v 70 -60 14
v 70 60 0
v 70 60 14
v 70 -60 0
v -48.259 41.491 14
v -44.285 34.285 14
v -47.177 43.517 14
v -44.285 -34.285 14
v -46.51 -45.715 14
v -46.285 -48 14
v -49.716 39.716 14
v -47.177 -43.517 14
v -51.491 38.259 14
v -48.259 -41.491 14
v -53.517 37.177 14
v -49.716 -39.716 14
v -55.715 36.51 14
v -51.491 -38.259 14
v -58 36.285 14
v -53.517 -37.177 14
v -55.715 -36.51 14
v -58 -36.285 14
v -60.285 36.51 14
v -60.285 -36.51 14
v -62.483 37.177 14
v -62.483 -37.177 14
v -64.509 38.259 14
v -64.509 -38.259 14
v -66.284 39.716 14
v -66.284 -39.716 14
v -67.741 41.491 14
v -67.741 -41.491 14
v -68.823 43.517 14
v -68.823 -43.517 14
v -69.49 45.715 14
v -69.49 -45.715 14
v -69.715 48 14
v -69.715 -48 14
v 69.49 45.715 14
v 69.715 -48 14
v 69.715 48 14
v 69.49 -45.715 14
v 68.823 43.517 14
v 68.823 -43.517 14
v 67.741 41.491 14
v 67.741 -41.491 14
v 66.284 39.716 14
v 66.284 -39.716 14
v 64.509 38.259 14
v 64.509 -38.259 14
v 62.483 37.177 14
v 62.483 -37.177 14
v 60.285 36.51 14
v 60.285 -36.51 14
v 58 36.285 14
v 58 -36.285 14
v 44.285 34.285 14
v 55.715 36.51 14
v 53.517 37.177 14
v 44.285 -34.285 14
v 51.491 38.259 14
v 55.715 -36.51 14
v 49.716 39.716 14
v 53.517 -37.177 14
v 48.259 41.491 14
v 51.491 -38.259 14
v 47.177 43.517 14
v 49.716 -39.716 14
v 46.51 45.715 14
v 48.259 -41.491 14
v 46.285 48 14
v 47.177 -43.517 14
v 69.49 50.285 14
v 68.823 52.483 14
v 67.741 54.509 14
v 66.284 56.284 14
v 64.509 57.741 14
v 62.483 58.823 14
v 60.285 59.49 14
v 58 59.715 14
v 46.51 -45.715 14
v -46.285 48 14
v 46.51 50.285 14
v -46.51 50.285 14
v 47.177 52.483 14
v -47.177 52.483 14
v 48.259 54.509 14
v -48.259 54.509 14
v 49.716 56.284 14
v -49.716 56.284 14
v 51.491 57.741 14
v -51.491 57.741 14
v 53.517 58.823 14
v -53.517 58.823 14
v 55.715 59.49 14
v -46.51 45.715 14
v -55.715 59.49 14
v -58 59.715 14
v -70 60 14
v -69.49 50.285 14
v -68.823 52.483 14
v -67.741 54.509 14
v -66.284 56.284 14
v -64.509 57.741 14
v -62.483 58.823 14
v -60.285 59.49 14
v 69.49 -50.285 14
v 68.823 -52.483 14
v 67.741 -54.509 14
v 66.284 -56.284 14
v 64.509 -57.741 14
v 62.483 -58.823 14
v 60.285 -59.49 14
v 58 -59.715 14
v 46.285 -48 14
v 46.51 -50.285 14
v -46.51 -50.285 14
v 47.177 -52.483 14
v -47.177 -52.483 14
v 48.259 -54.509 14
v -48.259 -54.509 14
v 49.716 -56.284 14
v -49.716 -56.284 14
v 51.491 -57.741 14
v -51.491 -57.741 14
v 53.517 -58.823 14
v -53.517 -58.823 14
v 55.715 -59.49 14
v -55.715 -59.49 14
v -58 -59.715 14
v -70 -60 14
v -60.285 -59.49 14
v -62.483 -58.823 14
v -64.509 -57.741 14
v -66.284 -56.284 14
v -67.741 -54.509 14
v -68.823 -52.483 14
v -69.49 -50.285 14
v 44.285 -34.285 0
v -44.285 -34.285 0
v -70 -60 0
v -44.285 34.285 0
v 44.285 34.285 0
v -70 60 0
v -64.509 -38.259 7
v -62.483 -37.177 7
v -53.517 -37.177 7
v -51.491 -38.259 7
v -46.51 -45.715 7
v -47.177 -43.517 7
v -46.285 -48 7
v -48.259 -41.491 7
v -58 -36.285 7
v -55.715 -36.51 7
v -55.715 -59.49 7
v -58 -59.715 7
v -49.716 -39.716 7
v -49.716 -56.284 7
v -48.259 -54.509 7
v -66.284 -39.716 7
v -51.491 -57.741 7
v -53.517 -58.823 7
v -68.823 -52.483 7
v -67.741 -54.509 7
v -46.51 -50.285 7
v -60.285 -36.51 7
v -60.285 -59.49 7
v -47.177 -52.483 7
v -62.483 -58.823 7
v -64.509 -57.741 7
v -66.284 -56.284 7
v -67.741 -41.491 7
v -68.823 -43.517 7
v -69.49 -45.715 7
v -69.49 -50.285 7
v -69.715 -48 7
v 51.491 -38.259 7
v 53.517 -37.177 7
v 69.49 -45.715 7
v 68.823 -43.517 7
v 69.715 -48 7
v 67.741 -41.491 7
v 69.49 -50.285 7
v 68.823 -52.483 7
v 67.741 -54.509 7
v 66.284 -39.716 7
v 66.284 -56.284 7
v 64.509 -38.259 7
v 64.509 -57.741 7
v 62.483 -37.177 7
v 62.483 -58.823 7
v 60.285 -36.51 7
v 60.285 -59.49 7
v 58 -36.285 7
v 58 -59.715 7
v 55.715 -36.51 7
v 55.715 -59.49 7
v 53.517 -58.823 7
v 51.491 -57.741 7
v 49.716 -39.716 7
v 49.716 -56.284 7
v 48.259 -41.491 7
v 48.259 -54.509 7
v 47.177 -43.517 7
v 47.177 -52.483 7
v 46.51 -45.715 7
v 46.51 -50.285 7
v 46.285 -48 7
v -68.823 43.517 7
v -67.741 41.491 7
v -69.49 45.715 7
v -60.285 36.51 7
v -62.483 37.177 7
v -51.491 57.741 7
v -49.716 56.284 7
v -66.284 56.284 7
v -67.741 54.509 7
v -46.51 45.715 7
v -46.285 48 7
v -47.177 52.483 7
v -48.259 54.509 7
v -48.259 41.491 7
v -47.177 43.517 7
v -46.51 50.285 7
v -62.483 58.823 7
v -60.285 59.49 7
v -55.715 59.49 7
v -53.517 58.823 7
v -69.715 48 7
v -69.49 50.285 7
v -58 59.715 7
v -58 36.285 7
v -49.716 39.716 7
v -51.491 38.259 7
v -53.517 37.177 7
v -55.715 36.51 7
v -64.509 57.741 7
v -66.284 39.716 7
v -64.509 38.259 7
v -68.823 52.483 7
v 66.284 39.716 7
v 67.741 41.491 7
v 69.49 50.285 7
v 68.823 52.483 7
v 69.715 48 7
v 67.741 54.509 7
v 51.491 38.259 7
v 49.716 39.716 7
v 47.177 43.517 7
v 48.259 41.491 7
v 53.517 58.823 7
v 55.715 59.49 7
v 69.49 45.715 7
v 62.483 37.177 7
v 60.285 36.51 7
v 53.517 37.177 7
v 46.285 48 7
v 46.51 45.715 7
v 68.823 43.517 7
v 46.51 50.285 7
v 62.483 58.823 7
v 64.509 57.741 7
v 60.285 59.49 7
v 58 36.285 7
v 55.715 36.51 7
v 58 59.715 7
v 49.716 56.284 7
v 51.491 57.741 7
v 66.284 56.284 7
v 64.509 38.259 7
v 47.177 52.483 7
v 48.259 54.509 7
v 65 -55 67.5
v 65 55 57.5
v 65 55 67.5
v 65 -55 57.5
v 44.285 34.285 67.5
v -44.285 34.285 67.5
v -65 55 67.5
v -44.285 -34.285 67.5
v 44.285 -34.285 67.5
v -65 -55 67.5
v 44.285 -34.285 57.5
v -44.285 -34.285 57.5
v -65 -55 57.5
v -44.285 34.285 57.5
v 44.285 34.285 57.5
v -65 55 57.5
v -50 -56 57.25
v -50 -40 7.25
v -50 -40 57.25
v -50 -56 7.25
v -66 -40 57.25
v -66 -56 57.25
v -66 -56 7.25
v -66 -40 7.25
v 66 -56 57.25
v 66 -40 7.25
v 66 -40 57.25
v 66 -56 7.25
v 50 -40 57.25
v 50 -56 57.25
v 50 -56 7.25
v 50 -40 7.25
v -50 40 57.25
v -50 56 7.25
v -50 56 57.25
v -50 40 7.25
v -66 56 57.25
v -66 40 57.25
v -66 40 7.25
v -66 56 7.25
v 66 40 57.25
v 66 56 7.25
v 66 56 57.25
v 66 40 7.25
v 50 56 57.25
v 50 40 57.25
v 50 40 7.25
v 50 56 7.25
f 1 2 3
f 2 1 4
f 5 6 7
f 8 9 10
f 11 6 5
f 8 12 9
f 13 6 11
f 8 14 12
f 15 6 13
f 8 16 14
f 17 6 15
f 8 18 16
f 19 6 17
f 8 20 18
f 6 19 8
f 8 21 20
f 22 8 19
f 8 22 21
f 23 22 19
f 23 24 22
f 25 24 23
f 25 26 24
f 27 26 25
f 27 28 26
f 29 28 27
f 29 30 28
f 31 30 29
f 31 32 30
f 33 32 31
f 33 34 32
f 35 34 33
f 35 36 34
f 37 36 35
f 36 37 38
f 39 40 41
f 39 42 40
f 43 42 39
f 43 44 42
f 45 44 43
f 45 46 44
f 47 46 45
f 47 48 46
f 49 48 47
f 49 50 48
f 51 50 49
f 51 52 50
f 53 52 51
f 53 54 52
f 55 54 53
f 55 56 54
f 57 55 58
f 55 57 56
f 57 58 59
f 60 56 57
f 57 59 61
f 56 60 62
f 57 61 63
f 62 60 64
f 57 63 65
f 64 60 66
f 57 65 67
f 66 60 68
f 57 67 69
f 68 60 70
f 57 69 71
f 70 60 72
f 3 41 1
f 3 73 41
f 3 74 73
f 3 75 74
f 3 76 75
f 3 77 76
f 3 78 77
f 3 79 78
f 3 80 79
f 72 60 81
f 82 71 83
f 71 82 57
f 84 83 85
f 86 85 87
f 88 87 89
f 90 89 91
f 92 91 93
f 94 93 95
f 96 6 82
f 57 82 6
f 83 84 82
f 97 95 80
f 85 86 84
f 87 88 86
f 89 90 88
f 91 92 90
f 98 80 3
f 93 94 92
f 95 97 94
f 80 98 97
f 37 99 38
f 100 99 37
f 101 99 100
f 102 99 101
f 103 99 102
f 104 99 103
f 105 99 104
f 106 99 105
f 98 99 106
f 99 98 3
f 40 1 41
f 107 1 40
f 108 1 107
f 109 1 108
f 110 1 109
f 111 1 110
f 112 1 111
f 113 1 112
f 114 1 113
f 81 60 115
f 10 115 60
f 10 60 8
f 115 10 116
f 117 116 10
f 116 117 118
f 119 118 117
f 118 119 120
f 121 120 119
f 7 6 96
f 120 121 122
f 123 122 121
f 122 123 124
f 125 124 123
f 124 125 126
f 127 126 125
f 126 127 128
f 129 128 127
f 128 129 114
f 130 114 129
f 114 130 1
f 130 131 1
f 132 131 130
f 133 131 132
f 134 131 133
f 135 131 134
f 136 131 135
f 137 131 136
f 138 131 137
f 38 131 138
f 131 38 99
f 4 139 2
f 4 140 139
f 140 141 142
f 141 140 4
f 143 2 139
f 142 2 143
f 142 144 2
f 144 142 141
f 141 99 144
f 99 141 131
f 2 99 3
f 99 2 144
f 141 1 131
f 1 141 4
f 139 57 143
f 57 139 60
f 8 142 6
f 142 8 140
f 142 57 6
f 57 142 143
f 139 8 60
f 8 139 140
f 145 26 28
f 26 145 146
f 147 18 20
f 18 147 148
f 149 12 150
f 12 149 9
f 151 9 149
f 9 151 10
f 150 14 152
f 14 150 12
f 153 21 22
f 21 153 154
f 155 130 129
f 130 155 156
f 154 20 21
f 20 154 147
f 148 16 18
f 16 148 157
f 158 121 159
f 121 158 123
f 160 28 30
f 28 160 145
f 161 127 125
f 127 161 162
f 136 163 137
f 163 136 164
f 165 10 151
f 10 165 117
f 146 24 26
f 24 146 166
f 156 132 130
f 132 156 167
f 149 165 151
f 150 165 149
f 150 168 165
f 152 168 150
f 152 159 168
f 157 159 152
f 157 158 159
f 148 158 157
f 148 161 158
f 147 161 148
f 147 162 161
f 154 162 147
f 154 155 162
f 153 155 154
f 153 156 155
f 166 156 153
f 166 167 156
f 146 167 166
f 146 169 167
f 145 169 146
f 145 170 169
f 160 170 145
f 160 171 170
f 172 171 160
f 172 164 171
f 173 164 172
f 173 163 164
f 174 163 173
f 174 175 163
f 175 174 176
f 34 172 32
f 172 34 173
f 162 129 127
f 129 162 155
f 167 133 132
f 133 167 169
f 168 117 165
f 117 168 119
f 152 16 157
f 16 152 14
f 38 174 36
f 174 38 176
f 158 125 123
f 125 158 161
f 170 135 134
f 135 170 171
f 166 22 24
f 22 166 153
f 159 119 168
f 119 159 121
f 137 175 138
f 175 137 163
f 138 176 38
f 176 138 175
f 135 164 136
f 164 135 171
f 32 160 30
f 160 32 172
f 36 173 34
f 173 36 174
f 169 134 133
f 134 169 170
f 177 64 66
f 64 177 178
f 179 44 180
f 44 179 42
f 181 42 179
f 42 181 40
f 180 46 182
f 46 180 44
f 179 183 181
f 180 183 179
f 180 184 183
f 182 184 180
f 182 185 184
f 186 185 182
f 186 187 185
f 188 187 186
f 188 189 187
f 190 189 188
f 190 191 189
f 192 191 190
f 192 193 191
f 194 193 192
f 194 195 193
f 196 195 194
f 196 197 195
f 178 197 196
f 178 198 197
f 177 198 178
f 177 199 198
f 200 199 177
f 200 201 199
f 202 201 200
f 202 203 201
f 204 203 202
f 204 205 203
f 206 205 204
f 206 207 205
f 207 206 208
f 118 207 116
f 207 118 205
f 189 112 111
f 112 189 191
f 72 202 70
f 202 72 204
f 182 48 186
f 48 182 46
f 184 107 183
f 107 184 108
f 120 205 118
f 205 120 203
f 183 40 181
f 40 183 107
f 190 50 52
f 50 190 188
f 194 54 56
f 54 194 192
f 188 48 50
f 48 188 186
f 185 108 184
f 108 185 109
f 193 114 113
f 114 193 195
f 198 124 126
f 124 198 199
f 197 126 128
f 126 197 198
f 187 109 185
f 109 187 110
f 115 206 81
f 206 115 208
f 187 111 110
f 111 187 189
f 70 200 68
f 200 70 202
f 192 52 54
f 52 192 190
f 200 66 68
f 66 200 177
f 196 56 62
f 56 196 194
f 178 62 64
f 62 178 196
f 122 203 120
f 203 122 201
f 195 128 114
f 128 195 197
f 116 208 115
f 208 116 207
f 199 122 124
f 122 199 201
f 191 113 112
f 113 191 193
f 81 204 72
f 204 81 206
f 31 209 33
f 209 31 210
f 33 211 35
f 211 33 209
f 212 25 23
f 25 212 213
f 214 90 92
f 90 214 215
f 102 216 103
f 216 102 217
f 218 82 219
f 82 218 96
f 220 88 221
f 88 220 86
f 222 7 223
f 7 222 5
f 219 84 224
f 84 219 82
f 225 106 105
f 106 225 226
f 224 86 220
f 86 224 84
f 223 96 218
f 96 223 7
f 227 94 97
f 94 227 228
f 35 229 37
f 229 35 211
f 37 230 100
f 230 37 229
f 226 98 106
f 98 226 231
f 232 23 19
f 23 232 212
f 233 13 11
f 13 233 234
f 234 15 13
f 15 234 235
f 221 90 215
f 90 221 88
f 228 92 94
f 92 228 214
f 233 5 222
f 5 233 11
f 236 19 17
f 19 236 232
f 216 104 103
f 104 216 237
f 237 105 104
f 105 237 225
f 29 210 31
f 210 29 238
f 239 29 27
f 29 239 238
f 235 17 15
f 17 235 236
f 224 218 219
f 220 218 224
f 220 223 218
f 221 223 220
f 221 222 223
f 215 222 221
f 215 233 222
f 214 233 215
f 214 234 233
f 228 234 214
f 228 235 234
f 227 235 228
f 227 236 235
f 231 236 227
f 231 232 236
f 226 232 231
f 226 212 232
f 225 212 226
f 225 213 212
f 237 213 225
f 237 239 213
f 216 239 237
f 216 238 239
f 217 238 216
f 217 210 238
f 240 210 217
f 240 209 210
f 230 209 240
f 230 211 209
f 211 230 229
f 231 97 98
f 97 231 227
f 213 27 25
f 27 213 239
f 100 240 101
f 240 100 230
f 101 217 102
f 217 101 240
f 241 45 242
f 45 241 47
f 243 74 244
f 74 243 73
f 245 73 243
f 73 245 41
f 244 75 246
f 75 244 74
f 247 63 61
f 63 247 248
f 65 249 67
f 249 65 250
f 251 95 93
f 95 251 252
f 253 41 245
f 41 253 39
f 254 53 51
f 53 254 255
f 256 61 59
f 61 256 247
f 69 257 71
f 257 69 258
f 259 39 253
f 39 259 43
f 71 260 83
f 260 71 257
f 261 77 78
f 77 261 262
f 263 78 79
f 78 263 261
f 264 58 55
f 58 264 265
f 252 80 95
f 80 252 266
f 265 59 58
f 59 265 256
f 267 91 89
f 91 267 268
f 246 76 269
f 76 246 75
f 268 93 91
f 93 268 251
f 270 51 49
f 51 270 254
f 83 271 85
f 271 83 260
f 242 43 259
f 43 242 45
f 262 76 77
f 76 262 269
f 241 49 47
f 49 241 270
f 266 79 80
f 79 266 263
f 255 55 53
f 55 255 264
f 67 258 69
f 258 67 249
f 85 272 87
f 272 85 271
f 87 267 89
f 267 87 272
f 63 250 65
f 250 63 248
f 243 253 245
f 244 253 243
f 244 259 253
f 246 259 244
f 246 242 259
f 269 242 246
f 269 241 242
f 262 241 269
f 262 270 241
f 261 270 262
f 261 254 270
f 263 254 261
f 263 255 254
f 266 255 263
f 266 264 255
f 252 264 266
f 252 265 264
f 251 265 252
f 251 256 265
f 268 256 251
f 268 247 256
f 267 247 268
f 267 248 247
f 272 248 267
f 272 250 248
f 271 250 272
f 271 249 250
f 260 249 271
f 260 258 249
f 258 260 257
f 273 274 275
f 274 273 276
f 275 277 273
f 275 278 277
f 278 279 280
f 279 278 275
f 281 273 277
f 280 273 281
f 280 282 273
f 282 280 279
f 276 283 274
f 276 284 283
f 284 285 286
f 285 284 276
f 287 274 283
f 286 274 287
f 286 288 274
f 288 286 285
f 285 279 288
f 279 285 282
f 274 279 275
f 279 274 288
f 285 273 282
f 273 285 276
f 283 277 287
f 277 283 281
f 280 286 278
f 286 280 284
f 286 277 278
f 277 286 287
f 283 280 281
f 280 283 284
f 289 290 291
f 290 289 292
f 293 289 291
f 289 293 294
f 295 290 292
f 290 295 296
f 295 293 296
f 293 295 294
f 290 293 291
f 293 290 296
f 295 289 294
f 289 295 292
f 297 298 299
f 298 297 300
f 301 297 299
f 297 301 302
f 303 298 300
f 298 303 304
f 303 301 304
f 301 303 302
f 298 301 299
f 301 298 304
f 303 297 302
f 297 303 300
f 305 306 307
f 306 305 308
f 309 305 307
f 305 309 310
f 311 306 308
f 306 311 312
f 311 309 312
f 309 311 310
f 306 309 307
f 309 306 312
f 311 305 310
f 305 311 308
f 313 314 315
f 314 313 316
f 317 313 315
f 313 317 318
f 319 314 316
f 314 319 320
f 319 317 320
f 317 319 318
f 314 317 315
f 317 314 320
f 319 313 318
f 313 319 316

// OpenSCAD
$fn = 32;

// ------------------------------------------------------------------------
// Frame cube: base 140 x 120 mm, posts 50 mm tall
// Every part is its own module, assembly() places every instance.
// ------------------------------------------------------------------------

// --- part 1 ---
module base_frame() {
  difference() {
    translate([-70, -60, 0]) cube([140, 120, 14]);
    translate([-44.285, -34.285, -1]) cube([88.57, 68.57, 16]);
    translate([-58, -48, 7]) cylinder(h = 8, d = 23.43);
    translate([58, -48, 7]) cylinder(h = 8, d = 23.43);
    translate([-58, 48, 7]) cylinder(h = 8, d = 23.43);
    translate([58, 48, 7]) cylinder(h = 8, d = 23.43);
  }
}

// --- part 2 ---
module corner_post() {
  translate([-8, -8, 0]) cube([16, 16, 50]);
}

// --- part 3 ---
module top_frame() {
  difference() {
    translate([-65, -55, 0]) cube([130, 110, 10]);
    translate([-44.285, -34.285, -1]) cube([88.57, 68.57, 12]);
  }
}

// --- assembly ---
module assembly() {
  color([0.80, 0.24, 0.20]) translate([0, 0, 0]) rotate([0, 0, 0]) base_frame();
  color([0.20, 0.45, 0.75]) translate([-58, -48, 7.25]) rotate([0, 0, 0]) corner_post();
  color([0.25, 0.62, 0.32]) translate([58, -48, 7.25]) rotate([0, 0, 0]) corner_post();
  color([0.92, 0.70, 0.18]) translate([-58, 48, 7.25]) rotate([0, 0, 0]) corner_post();
  color([0.58, 0.35, 0.70]) translate([58, 48, 7.25]) rotate([0, 0, 0]) corner_post();
  color([0.16, 0.66, 0.66]) translate([0, 0, 57.5]) rotate([0, 0, 0]) top_frame();
}

assembly();
